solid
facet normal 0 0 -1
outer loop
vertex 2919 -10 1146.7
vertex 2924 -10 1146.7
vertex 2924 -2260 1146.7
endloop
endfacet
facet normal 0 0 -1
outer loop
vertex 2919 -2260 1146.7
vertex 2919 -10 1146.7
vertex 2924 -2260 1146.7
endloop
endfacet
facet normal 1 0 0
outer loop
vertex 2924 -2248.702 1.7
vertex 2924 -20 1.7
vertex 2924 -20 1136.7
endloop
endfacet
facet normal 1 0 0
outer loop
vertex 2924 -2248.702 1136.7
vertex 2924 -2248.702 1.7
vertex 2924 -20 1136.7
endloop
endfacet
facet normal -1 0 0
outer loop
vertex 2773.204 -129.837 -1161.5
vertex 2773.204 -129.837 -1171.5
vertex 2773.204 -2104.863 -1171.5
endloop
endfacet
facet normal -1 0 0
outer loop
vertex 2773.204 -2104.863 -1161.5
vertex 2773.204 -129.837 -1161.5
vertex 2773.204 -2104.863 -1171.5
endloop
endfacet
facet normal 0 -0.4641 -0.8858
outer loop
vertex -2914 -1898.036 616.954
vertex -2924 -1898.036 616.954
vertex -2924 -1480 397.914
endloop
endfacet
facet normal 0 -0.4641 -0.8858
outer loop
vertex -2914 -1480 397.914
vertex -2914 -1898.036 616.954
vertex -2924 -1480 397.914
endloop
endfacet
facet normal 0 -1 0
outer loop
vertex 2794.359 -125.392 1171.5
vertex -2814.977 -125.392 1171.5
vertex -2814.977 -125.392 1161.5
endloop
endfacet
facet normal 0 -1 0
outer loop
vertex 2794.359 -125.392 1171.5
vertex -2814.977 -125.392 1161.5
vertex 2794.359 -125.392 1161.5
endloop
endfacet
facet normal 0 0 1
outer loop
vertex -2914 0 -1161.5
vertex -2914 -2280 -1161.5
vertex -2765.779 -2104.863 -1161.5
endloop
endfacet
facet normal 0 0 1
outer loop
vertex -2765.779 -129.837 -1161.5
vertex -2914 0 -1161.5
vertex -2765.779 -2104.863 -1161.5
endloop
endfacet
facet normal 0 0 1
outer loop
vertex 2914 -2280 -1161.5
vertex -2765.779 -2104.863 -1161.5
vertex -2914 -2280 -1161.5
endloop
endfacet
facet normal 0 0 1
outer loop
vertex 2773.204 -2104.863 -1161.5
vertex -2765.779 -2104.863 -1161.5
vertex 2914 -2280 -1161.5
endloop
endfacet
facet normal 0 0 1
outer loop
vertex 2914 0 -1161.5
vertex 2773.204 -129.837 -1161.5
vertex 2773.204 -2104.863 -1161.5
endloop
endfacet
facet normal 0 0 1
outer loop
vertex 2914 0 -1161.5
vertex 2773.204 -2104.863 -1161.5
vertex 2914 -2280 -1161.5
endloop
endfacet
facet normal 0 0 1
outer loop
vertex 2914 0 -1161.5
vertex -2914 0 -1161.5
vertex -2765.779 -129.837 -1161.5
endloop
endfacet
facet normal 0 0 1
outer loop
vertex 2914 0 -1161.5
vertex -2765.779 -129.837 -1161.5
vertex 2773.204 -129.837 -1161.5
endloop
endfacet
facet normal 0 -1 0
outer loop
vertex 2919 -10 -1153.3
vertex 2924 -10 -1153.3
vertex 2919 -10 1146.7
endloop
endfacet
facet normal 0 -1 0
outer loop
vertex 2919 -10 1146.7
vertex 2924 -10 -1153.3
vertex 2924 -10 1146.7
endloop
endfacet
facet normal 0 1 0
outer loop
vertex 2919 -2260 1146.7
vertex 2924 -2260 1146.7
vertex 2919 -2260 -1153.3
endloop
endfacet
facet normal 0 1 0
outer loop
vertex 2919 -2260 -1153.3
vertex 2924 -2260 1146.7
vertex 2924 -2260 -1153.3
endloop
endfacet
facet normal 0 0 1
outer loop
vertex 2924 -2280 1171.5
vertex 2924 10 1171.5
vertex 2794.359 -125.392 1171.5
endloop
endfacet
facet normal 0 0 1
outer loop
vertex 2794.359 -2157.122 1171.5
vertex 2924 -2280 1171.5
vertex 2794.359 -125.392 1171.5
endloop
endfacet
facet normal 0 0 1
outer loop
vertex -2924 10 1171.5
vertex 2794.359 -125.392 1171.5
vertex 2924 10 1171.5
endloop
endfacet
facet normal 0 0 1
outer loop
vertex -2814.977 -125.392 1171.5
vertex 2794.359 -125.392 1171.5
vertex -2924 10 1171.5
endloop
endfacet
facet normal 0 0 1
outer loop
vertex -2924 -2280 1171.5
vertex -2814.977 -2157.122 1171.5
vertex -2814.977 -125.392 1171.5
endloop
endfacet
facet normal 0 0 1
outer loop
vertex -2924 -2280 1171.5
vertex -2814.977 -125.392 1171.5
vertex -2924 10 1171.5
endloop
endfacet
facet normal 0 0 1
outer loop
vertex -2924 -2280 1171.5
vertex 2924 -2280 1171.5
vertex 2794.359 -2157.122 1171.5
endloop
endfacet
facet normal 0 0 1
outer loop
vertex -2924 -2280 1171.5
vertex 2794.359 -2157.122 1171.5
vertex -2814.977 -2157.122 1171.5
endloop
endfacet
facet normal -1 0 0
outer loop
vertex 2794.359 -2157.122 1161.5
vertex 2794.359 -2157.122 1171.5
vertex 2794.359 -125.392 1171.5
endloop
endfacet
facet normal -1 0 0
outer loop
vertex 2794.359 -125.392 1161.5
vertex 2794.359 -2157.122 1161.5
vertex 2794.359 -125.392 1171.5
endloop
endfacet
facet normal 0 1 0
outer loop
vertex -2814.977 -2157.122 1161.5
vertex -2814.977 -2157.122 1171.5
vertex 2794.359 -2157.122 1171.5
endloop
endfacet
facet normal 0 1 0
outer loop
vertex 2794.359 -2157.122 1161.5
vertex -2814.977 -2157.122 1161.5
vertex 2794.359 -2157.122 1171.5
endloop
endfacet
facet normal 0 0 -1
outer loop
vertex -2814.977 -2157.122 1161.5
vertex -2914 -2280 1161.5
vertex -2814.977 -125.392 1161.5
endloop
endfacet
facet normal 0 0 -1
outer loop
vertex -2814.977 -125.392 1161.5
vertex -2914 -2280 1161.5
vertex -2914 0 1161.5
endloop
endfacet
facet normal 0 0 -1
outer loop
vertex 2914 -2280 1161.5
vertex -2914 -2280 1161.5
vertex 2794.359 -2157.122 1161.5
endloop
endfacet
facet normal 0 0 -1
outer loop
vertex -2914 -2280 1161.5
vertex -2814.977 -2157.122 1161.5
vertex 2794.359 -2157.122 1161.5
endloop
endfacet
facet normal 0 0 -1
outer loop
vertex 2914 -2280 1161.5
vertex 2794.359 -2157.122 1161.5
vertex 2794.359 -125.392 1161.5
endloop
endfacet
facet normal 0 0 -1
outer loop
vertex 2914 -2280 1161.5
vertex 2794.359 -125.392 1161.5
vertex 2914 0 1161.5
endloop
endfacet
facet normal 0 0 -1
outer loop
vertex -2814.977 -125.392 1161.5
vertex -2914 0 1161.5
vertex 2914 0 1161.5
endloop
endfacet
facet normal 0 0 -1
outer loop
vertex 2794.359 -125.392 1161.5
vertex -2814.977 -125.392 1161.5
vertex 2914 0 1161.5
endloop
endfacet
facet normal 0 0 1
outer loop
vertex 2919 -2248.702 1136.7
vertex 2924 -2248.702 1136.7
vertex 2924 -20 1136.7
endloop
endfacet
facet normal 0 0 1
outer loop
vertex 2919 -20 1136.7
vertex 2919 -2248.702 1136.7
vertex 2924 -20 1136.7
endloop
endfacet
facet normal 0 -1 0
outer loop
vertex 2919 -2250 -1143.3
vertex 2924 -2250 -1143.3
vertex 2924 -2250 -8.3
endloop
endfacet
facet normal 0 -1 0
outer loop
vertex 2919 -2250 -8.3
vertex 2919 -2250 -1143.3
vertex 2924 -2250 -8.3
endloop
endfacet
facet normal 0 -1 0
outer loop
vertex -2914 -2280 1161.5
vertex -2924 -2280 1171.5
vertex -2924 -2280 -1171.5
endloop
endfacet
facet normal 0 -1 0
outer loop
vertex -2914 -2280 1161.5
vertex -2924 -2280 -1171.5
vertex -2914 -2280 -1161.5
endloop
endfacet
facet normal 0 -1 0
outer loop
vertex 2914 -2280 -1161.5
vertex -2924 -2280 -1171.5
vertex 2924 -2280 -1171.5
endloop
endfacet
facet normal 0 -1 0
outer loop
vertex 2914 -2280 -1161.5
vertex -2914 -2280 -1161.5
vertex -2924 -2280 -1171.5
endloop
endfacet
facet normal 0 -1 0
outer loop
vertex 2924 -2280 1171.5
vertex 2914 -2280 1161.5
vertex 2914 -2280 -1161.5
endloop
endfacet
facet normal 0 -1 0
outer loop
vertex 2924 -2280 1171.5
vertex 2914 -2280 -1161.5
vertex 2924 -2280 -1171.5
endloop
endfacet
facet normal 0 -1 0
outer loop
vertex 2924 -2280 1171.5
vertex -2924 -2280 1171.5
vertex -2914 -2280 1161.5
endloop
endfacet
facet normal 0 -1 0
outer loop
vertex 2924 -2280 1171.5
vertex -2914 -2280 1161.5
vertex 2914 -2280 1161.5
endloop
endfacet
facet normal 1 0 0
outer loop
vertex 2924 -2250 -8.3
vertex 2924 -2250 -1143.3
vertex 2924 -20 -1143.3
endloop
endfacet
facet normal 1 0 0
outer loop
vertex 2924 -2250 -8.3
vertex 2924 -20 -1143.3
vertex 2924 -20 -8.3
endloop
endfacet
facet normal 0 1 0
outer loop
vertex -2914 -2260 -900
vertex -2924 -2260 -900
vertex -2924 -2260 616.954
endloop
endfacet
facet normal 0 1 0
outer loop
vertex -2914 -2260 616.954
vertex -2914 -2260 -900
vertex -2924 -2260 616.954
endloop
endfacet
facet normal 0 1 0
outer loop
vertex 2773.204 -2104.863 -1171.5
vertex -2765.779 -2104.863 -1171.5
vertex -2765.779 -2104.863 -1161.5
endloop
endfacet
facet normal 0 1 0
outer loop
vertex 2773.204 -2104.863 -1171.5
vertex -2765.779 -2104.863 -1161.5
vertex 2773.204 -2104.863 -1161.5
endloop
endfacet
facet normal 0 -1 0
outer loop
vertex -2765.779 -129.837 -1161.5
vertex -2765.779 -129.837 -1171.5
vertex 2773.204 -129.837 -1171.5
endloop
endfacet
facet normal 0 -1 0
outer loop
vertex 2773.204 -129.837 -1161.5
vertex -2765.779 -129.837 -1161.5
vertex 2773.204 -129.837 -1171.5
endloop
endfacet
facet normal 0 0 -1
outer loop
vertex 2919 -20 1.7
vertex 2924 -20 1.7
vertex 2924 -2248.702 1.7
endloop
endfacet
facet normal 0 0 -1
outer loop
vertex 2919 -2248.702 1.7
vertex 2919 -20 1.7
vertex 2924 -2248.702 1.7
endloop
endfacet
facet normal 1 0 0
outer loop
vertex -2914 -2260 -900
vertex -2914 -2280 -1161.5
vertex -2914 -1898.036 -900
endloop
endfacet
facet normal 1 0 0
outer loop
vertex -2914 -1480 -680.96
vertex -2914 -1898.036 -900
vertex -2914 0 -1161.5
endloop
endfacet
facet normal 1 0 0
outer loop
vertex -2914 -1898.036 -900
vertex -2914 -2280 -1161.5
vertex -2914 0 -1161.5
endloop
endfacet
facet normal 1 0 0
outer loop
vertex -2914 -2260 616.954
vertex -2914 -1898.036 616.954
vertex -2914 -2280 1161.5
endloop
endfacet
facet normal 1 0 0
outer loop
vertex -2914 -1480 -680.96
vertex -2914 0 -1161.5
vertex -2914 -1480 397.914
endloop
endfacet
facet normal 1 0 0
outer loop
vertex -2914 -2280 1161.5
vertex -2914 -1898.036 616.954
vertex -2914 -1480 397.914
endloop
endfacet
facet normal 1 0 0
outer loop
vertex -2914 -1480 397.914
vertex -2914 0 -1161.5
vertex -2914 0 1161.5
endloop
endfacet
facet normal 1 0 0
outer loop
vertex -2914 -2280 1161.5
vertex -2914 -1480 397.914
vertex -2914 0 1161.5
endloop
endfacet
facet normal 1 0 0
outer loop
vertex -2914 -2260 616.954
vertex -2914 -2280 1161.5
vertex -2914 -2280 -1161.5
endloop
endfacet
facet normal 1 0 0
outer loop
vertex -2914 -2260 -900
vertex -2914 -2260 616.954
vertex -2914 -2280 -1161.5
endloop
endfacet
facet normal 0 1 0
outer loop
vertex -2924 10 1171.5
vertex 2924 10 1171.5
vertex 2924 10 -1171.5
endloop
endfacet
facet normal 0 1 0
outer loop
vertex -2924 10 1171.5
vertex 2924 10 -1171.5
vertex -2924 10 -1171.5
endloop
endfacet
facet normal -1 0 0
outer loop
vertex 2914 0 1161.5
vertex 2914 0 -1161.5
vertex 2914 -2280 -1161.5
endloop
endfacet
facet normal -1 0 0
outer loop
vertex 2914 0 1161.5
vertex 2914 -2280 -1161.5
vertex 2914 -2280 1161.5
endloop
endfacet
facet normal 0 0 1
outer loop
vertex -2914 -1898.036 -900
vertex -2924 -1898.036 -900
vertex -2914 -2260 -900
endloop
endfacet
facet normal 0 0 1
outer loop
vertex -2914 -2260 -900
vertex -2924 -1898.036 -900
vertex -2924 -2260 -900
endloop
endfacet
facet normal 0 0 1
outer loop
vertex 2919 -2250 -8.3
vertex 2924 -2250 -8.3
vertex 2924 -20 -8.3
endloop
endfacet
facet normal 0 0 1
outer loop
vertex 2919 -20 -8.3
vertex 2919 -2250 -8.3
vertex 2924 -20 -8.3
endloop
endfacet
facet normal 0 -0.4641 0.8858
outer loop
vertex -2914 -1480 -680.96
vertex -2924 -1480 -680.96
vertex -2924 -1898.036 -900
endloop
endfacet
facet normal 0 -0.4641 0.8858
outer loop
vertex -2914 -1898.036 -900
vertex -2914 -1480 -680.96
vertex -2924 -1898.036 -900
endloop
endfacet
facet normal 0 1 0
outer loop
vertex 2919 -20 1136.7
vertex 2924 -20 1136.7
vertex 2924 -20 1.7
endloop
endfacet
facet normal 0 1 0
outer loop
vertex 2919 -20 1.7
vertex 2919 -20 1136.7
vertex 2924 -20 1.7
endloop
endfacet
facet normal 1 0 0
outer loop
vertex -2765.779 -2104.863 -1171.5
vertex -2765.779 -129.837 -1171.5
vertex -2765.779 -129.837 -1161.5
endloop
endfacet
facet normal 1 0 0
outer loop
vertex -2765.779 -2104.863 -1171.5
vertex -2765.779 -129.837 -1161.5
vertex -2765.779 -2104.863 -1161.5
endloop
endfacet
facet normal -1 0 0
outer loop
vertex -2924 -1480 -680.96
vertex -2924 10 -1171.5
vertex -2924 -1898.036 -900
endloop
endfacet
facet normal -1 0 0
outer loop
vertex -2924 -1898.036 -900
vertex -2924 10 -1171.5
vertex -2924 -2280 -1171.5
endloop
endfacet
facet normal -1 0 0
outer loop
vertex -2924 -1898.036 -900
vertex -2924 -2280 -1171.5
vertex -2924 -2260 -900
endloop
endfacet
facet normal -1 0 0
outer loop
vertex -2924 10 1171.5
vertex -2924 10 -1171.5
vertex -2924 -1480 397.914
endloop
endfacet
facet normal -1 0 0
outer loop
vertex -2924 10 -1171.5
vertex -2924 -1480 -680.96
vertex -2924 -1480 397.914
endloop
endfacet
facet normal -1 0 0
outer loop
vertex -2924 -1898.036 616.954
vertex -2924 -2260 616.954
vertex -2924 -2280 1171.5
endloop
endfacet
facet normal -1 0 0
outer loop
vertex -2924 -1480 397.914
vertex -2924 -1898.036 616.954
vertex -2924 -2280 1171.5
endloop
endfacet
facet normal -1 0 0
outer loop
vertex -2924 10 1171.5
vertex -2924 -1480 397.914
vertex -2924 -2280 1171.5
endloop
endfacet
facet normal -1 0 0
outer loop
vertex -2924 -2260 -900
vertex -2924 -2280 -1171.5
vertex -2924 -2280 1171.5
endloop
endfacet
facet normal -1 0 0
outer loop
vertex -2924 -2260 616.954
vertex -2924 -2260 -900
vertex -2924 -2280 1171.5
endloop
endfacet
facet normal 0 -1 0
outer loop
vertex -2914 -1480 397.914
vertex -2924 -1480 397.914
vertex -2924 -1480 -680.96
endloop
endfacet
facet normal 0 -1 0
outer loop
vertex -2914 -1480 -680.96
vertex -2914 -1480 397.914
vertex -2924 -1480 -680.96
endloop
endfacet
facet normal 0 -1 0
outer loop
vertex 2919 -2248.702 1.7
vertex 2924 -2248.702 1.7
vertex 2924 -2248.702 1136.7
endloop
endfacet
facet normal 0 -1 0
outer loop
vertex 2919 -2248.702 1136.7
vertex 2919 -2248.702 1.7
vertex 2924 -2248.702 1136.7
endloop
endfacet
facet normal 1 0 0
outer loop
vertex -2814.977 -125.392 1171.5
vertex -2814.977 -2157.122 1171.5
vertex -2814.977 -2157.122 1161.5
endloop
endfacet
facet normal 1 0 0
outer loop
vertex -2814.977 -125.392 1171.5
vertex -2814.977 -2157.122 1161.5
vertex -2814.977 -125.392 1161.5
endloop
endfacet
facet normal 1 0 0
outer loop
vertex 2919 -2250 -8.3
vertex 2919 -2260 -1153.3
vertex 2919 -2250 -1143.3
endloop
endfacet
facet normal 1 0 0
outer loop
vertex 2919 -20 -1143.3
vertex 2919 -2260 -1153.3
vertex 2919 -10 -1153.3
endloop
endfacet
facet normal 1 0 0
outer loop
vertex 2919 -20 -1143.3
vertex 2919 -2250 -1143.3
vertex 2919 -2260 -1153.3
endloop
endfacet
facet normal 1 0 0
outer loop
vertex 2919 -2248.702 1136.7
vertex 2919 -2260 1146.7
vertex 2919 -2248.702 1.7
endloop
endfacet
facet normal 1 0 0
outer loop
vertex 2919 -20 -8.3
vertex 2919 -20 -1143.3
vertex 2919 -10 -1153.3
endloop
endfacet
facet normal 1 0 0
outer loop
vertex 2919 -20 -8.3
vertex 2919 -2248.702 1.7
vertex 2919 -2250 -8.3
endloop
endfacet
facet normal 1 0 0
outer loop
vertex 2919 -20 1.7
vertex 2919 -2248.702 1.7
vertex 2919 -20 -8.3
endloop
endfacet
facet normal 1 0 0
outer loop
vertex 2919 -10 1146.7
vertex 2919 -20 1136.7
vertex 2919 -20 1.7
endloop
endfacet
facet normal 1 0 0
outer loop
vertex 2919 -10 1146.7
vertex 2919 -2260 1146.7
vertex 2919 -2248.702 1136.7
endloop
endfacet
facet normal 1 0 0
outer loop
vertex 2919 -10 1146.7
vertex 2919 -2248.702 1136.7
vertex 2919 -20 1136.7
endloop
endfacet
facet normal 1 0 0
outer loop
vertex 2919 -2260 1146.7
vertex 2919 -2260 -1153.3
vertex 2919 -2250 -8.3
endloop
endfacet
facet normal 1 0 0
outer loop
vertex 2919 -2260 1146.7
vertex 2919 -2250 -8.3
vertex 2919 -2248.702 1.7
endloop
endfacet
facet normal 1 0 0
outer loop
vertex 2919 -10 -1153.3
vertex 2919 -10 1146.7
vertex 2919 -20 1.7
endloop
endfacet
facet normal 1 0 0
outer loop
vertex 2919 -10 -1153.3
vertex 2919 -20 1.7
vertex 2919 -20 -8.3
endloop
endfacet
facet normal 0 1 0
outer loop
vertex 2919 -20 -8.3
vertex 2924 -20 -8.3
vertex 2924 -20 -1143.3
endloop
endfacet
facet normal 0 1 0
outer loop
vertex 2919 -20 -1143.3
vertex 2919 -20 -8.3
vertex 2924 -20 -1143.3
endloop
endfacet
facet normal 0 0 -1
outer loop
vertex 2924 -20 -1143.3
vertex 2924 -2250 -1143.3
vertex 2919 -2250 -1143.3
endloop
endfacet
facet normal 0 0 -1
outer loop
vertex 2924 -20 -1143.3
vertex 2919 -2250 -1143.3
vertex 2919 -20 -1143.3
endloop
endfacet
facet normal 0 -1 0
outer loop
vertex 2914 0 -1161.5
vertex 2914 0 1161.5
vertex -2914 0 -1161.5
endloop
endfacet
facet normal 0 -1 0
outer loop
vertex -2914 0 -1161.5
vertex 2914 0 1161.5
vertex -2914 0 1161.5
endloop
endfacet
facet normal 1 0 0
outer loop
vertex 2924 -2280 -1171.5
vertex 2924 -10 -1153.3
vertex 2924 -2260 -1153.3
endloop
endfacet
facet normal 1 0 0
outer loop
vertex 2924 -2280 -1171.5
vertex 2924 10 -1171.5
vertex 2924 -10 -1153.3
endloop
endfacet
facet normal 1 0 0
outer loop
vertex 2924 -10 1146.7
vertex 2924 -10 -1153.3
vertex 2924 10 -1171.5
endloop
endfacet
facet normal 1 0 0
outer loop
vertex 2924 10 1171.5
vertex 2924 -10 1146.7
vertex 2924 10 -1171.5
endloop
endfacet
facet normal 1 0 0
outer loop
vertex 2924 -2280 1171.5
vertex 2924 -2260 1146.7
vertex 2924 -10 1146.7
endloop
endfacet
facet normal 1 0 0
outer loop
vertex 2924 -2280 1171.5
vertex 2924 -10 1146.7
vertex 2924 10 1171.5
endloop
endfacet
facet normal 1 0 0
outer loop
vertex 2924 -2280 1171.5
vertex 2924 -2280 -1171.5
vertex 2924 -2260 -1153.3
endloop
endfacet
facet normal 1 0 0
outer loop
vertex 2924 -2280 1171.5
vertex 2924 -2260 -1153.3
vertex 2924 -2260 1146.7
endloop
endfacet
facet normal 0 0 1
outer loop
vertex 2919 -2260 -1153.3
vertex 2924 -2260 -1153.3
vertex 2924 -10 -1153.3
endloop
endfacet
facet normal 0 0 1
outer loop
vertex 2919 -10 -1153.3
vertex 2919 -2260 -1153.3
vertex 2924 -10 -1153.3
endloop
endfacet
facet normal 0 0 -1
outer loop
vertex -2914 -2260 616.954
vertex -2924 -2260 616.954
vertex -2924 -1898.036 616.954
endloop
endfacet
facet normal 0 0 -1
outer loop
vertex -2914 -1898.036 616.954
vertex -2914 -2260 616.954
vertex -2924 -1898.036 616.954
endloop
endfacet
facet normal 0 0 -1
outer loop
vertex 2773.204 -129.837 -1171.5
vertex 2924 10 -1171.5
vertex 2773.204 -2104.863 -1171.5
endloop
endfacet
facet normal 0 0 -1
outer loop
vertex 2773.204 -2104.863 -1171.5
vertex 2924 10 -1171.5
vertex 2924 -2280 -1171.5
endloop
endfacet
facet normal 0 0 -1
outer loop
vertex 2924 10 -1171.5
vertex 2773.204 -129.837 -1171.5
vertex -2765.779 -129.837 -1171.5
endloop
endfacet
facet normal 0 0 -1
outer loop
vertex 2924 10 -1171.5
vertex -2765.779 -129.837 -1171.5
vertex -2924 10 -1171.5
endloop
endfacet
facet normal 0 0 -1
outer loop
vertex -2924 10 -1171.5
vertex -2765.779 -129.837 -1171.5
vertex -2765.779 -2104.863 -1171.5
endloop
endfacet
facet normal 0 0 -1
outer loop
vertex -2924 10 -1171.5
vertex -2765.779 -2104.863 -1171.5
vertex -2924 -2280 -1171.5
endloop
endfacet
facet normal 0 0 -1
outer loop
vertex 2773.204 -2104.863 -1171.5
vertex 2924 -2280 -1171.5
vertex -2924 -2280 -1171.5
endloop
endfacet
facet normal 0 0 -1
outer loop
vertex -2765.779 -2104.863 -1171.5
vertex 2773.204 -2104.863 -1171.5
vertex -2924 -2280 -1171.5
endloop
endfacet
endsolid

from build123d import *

# Parameters (mm, degrees)
F0_W      = 5848
F0_H      = 2343
F0_W_2    = 5828
F0_H_2    = 2323
F1_DEPTH  = 2280
F2_W      = 5848
F2_H      = 2343
F2_W_2    = 5828
F2_H_2    = 2323
F3_DEPTH  = 10
F4_W      = 5538.9823913574
F4_H      = 1975.0258177519
F5_DEPTH  = 25
F7_DEPTH  = 25
F8_W      = 2228.7018108368
F8_H      = 10
F8_W_2    = 2230
F9_DEPTH  = 5
F10_W     = 5609.335899353
F10_H     = 2031.7305922508
F11_DEPTH = 25


# Not quite as in the source:
# - a feature names something its author has since deleted; it is built from what else it names


with BuildPart() as f1:
    # F0 (on Front) → F1 (new body)
    with BuildSketch(Plane.XZ):
        Rectangle(F0_W, F0_H)
        Rectangle(F0_W_2, F0_H_2, mode=Mode.SUBTRACT)
    extrude(amount=F1_DEPTH)

    # F2 (on face) → F3 (join)
    with BuildSketch(Plane(origin=(0, 0, 0), x_dir=(-1, 0, 0), z_dir=(0, 1, 0))):
        Rectangle(F2_W, F2_H)
        Rectangle(F2_W_2, F2_H_2, mode=Mode.SUBTRACT)
        Rectangle(F2_W_2, F2_H_2)
    extrude(amount=F3_DEPTH)

    # F4 (on face) → F5 (cut)
    with BuildSketch(Plane(origin=(0, 0, -1171.5), x_dir=(1, 0, 0), z_dir=(0, 0, -1))):
        with Locations((3.7124156952, 1117.349781096)):
            Rectangle(F4_W, F4_H)
    extrude(amount=-F5_DEPTH, mode=Mode.SUBTRACT)

    # F6 (on face) → F7 (cut)
    with BuildSketch(Plane(origin=(-2924, 0, 0), x_dir=(0, -1, 0), z_dir=(-1, 0, 0))):
        Polygon((2260, -900), (2260, 616.9540286064), (1898.0355262756, 616.9540286064), (1480, 397.9138715092), (1480, -680.9598410104), (1898.03553, -900), (2053.3208847046, -900), align=None)
    extrude(amount=-F7_DEPTH, mode=Mode.SUBTRACT)

    # F8 (on face) → F9 (cut)
    with BuildSketch(Plane.YZ.offset(2924)):
        Polygon((-2248.7018108368, 1.6998175904), (-2260, 1.6998175904), (-2260, -8.3001824096), (-2250, -8.3001824096), (-2248.7018108368, -8.3001824096), (-20, -8.3001824096), (-10, -8.3001824096), (-10, 1.6998175904), (-20, 1.6998175904), align=None)
        Polygon((-20, 1136.6998175904), (-20, 1.6998175904), (-10, 1.6998175904), (-10, 1146.6998175904), (-20, 1146.6998175904), align=None)
        with Locations((-1134.3509054184, 1141.6998175904)):
            Rectangle(F8_W, F8_H)
        Polygon((-2260, 1146.6998175904), (-2260, 1.6998175904), (-2248.7018108368, 1.6998175904), (-2248.7018108368, 1136.6998175904), (-2248.7018108368, 1146.6998175904), align=None)
        Polygon((-2250, -8.3001824096), (-2260, -8.3001824096), (-2260, -1153.3001824096), (-2250, -1153.3001824096), (-2250, -1143.3001824096), align=None)
        with Locations((-1135, -1148.3001824096)):
            Rectangle(F8_W_2, F8_H)
        Polygon((-10, -1153.3001824096), (-10, -8.3001824096), (-20, -8.3001824096), (-20, -1143.3001824096), (-20, -1153.3001824096), align=None)
    extrude(amount=-F9_DEPTH, mode=Mode.SUBTRACT)

    # F10 (on face) → F11 (cut)
    with BuildSketch(Plane.XY.offset(1171.5)):
        with Locations((-10.3087425232, -1141.2568390369)):
            Rectangle(F10_W, F10_H)
    extrude(amount=-F11_DEPTH, mode=Mode.SUBTRACT)


solid = f1.part
